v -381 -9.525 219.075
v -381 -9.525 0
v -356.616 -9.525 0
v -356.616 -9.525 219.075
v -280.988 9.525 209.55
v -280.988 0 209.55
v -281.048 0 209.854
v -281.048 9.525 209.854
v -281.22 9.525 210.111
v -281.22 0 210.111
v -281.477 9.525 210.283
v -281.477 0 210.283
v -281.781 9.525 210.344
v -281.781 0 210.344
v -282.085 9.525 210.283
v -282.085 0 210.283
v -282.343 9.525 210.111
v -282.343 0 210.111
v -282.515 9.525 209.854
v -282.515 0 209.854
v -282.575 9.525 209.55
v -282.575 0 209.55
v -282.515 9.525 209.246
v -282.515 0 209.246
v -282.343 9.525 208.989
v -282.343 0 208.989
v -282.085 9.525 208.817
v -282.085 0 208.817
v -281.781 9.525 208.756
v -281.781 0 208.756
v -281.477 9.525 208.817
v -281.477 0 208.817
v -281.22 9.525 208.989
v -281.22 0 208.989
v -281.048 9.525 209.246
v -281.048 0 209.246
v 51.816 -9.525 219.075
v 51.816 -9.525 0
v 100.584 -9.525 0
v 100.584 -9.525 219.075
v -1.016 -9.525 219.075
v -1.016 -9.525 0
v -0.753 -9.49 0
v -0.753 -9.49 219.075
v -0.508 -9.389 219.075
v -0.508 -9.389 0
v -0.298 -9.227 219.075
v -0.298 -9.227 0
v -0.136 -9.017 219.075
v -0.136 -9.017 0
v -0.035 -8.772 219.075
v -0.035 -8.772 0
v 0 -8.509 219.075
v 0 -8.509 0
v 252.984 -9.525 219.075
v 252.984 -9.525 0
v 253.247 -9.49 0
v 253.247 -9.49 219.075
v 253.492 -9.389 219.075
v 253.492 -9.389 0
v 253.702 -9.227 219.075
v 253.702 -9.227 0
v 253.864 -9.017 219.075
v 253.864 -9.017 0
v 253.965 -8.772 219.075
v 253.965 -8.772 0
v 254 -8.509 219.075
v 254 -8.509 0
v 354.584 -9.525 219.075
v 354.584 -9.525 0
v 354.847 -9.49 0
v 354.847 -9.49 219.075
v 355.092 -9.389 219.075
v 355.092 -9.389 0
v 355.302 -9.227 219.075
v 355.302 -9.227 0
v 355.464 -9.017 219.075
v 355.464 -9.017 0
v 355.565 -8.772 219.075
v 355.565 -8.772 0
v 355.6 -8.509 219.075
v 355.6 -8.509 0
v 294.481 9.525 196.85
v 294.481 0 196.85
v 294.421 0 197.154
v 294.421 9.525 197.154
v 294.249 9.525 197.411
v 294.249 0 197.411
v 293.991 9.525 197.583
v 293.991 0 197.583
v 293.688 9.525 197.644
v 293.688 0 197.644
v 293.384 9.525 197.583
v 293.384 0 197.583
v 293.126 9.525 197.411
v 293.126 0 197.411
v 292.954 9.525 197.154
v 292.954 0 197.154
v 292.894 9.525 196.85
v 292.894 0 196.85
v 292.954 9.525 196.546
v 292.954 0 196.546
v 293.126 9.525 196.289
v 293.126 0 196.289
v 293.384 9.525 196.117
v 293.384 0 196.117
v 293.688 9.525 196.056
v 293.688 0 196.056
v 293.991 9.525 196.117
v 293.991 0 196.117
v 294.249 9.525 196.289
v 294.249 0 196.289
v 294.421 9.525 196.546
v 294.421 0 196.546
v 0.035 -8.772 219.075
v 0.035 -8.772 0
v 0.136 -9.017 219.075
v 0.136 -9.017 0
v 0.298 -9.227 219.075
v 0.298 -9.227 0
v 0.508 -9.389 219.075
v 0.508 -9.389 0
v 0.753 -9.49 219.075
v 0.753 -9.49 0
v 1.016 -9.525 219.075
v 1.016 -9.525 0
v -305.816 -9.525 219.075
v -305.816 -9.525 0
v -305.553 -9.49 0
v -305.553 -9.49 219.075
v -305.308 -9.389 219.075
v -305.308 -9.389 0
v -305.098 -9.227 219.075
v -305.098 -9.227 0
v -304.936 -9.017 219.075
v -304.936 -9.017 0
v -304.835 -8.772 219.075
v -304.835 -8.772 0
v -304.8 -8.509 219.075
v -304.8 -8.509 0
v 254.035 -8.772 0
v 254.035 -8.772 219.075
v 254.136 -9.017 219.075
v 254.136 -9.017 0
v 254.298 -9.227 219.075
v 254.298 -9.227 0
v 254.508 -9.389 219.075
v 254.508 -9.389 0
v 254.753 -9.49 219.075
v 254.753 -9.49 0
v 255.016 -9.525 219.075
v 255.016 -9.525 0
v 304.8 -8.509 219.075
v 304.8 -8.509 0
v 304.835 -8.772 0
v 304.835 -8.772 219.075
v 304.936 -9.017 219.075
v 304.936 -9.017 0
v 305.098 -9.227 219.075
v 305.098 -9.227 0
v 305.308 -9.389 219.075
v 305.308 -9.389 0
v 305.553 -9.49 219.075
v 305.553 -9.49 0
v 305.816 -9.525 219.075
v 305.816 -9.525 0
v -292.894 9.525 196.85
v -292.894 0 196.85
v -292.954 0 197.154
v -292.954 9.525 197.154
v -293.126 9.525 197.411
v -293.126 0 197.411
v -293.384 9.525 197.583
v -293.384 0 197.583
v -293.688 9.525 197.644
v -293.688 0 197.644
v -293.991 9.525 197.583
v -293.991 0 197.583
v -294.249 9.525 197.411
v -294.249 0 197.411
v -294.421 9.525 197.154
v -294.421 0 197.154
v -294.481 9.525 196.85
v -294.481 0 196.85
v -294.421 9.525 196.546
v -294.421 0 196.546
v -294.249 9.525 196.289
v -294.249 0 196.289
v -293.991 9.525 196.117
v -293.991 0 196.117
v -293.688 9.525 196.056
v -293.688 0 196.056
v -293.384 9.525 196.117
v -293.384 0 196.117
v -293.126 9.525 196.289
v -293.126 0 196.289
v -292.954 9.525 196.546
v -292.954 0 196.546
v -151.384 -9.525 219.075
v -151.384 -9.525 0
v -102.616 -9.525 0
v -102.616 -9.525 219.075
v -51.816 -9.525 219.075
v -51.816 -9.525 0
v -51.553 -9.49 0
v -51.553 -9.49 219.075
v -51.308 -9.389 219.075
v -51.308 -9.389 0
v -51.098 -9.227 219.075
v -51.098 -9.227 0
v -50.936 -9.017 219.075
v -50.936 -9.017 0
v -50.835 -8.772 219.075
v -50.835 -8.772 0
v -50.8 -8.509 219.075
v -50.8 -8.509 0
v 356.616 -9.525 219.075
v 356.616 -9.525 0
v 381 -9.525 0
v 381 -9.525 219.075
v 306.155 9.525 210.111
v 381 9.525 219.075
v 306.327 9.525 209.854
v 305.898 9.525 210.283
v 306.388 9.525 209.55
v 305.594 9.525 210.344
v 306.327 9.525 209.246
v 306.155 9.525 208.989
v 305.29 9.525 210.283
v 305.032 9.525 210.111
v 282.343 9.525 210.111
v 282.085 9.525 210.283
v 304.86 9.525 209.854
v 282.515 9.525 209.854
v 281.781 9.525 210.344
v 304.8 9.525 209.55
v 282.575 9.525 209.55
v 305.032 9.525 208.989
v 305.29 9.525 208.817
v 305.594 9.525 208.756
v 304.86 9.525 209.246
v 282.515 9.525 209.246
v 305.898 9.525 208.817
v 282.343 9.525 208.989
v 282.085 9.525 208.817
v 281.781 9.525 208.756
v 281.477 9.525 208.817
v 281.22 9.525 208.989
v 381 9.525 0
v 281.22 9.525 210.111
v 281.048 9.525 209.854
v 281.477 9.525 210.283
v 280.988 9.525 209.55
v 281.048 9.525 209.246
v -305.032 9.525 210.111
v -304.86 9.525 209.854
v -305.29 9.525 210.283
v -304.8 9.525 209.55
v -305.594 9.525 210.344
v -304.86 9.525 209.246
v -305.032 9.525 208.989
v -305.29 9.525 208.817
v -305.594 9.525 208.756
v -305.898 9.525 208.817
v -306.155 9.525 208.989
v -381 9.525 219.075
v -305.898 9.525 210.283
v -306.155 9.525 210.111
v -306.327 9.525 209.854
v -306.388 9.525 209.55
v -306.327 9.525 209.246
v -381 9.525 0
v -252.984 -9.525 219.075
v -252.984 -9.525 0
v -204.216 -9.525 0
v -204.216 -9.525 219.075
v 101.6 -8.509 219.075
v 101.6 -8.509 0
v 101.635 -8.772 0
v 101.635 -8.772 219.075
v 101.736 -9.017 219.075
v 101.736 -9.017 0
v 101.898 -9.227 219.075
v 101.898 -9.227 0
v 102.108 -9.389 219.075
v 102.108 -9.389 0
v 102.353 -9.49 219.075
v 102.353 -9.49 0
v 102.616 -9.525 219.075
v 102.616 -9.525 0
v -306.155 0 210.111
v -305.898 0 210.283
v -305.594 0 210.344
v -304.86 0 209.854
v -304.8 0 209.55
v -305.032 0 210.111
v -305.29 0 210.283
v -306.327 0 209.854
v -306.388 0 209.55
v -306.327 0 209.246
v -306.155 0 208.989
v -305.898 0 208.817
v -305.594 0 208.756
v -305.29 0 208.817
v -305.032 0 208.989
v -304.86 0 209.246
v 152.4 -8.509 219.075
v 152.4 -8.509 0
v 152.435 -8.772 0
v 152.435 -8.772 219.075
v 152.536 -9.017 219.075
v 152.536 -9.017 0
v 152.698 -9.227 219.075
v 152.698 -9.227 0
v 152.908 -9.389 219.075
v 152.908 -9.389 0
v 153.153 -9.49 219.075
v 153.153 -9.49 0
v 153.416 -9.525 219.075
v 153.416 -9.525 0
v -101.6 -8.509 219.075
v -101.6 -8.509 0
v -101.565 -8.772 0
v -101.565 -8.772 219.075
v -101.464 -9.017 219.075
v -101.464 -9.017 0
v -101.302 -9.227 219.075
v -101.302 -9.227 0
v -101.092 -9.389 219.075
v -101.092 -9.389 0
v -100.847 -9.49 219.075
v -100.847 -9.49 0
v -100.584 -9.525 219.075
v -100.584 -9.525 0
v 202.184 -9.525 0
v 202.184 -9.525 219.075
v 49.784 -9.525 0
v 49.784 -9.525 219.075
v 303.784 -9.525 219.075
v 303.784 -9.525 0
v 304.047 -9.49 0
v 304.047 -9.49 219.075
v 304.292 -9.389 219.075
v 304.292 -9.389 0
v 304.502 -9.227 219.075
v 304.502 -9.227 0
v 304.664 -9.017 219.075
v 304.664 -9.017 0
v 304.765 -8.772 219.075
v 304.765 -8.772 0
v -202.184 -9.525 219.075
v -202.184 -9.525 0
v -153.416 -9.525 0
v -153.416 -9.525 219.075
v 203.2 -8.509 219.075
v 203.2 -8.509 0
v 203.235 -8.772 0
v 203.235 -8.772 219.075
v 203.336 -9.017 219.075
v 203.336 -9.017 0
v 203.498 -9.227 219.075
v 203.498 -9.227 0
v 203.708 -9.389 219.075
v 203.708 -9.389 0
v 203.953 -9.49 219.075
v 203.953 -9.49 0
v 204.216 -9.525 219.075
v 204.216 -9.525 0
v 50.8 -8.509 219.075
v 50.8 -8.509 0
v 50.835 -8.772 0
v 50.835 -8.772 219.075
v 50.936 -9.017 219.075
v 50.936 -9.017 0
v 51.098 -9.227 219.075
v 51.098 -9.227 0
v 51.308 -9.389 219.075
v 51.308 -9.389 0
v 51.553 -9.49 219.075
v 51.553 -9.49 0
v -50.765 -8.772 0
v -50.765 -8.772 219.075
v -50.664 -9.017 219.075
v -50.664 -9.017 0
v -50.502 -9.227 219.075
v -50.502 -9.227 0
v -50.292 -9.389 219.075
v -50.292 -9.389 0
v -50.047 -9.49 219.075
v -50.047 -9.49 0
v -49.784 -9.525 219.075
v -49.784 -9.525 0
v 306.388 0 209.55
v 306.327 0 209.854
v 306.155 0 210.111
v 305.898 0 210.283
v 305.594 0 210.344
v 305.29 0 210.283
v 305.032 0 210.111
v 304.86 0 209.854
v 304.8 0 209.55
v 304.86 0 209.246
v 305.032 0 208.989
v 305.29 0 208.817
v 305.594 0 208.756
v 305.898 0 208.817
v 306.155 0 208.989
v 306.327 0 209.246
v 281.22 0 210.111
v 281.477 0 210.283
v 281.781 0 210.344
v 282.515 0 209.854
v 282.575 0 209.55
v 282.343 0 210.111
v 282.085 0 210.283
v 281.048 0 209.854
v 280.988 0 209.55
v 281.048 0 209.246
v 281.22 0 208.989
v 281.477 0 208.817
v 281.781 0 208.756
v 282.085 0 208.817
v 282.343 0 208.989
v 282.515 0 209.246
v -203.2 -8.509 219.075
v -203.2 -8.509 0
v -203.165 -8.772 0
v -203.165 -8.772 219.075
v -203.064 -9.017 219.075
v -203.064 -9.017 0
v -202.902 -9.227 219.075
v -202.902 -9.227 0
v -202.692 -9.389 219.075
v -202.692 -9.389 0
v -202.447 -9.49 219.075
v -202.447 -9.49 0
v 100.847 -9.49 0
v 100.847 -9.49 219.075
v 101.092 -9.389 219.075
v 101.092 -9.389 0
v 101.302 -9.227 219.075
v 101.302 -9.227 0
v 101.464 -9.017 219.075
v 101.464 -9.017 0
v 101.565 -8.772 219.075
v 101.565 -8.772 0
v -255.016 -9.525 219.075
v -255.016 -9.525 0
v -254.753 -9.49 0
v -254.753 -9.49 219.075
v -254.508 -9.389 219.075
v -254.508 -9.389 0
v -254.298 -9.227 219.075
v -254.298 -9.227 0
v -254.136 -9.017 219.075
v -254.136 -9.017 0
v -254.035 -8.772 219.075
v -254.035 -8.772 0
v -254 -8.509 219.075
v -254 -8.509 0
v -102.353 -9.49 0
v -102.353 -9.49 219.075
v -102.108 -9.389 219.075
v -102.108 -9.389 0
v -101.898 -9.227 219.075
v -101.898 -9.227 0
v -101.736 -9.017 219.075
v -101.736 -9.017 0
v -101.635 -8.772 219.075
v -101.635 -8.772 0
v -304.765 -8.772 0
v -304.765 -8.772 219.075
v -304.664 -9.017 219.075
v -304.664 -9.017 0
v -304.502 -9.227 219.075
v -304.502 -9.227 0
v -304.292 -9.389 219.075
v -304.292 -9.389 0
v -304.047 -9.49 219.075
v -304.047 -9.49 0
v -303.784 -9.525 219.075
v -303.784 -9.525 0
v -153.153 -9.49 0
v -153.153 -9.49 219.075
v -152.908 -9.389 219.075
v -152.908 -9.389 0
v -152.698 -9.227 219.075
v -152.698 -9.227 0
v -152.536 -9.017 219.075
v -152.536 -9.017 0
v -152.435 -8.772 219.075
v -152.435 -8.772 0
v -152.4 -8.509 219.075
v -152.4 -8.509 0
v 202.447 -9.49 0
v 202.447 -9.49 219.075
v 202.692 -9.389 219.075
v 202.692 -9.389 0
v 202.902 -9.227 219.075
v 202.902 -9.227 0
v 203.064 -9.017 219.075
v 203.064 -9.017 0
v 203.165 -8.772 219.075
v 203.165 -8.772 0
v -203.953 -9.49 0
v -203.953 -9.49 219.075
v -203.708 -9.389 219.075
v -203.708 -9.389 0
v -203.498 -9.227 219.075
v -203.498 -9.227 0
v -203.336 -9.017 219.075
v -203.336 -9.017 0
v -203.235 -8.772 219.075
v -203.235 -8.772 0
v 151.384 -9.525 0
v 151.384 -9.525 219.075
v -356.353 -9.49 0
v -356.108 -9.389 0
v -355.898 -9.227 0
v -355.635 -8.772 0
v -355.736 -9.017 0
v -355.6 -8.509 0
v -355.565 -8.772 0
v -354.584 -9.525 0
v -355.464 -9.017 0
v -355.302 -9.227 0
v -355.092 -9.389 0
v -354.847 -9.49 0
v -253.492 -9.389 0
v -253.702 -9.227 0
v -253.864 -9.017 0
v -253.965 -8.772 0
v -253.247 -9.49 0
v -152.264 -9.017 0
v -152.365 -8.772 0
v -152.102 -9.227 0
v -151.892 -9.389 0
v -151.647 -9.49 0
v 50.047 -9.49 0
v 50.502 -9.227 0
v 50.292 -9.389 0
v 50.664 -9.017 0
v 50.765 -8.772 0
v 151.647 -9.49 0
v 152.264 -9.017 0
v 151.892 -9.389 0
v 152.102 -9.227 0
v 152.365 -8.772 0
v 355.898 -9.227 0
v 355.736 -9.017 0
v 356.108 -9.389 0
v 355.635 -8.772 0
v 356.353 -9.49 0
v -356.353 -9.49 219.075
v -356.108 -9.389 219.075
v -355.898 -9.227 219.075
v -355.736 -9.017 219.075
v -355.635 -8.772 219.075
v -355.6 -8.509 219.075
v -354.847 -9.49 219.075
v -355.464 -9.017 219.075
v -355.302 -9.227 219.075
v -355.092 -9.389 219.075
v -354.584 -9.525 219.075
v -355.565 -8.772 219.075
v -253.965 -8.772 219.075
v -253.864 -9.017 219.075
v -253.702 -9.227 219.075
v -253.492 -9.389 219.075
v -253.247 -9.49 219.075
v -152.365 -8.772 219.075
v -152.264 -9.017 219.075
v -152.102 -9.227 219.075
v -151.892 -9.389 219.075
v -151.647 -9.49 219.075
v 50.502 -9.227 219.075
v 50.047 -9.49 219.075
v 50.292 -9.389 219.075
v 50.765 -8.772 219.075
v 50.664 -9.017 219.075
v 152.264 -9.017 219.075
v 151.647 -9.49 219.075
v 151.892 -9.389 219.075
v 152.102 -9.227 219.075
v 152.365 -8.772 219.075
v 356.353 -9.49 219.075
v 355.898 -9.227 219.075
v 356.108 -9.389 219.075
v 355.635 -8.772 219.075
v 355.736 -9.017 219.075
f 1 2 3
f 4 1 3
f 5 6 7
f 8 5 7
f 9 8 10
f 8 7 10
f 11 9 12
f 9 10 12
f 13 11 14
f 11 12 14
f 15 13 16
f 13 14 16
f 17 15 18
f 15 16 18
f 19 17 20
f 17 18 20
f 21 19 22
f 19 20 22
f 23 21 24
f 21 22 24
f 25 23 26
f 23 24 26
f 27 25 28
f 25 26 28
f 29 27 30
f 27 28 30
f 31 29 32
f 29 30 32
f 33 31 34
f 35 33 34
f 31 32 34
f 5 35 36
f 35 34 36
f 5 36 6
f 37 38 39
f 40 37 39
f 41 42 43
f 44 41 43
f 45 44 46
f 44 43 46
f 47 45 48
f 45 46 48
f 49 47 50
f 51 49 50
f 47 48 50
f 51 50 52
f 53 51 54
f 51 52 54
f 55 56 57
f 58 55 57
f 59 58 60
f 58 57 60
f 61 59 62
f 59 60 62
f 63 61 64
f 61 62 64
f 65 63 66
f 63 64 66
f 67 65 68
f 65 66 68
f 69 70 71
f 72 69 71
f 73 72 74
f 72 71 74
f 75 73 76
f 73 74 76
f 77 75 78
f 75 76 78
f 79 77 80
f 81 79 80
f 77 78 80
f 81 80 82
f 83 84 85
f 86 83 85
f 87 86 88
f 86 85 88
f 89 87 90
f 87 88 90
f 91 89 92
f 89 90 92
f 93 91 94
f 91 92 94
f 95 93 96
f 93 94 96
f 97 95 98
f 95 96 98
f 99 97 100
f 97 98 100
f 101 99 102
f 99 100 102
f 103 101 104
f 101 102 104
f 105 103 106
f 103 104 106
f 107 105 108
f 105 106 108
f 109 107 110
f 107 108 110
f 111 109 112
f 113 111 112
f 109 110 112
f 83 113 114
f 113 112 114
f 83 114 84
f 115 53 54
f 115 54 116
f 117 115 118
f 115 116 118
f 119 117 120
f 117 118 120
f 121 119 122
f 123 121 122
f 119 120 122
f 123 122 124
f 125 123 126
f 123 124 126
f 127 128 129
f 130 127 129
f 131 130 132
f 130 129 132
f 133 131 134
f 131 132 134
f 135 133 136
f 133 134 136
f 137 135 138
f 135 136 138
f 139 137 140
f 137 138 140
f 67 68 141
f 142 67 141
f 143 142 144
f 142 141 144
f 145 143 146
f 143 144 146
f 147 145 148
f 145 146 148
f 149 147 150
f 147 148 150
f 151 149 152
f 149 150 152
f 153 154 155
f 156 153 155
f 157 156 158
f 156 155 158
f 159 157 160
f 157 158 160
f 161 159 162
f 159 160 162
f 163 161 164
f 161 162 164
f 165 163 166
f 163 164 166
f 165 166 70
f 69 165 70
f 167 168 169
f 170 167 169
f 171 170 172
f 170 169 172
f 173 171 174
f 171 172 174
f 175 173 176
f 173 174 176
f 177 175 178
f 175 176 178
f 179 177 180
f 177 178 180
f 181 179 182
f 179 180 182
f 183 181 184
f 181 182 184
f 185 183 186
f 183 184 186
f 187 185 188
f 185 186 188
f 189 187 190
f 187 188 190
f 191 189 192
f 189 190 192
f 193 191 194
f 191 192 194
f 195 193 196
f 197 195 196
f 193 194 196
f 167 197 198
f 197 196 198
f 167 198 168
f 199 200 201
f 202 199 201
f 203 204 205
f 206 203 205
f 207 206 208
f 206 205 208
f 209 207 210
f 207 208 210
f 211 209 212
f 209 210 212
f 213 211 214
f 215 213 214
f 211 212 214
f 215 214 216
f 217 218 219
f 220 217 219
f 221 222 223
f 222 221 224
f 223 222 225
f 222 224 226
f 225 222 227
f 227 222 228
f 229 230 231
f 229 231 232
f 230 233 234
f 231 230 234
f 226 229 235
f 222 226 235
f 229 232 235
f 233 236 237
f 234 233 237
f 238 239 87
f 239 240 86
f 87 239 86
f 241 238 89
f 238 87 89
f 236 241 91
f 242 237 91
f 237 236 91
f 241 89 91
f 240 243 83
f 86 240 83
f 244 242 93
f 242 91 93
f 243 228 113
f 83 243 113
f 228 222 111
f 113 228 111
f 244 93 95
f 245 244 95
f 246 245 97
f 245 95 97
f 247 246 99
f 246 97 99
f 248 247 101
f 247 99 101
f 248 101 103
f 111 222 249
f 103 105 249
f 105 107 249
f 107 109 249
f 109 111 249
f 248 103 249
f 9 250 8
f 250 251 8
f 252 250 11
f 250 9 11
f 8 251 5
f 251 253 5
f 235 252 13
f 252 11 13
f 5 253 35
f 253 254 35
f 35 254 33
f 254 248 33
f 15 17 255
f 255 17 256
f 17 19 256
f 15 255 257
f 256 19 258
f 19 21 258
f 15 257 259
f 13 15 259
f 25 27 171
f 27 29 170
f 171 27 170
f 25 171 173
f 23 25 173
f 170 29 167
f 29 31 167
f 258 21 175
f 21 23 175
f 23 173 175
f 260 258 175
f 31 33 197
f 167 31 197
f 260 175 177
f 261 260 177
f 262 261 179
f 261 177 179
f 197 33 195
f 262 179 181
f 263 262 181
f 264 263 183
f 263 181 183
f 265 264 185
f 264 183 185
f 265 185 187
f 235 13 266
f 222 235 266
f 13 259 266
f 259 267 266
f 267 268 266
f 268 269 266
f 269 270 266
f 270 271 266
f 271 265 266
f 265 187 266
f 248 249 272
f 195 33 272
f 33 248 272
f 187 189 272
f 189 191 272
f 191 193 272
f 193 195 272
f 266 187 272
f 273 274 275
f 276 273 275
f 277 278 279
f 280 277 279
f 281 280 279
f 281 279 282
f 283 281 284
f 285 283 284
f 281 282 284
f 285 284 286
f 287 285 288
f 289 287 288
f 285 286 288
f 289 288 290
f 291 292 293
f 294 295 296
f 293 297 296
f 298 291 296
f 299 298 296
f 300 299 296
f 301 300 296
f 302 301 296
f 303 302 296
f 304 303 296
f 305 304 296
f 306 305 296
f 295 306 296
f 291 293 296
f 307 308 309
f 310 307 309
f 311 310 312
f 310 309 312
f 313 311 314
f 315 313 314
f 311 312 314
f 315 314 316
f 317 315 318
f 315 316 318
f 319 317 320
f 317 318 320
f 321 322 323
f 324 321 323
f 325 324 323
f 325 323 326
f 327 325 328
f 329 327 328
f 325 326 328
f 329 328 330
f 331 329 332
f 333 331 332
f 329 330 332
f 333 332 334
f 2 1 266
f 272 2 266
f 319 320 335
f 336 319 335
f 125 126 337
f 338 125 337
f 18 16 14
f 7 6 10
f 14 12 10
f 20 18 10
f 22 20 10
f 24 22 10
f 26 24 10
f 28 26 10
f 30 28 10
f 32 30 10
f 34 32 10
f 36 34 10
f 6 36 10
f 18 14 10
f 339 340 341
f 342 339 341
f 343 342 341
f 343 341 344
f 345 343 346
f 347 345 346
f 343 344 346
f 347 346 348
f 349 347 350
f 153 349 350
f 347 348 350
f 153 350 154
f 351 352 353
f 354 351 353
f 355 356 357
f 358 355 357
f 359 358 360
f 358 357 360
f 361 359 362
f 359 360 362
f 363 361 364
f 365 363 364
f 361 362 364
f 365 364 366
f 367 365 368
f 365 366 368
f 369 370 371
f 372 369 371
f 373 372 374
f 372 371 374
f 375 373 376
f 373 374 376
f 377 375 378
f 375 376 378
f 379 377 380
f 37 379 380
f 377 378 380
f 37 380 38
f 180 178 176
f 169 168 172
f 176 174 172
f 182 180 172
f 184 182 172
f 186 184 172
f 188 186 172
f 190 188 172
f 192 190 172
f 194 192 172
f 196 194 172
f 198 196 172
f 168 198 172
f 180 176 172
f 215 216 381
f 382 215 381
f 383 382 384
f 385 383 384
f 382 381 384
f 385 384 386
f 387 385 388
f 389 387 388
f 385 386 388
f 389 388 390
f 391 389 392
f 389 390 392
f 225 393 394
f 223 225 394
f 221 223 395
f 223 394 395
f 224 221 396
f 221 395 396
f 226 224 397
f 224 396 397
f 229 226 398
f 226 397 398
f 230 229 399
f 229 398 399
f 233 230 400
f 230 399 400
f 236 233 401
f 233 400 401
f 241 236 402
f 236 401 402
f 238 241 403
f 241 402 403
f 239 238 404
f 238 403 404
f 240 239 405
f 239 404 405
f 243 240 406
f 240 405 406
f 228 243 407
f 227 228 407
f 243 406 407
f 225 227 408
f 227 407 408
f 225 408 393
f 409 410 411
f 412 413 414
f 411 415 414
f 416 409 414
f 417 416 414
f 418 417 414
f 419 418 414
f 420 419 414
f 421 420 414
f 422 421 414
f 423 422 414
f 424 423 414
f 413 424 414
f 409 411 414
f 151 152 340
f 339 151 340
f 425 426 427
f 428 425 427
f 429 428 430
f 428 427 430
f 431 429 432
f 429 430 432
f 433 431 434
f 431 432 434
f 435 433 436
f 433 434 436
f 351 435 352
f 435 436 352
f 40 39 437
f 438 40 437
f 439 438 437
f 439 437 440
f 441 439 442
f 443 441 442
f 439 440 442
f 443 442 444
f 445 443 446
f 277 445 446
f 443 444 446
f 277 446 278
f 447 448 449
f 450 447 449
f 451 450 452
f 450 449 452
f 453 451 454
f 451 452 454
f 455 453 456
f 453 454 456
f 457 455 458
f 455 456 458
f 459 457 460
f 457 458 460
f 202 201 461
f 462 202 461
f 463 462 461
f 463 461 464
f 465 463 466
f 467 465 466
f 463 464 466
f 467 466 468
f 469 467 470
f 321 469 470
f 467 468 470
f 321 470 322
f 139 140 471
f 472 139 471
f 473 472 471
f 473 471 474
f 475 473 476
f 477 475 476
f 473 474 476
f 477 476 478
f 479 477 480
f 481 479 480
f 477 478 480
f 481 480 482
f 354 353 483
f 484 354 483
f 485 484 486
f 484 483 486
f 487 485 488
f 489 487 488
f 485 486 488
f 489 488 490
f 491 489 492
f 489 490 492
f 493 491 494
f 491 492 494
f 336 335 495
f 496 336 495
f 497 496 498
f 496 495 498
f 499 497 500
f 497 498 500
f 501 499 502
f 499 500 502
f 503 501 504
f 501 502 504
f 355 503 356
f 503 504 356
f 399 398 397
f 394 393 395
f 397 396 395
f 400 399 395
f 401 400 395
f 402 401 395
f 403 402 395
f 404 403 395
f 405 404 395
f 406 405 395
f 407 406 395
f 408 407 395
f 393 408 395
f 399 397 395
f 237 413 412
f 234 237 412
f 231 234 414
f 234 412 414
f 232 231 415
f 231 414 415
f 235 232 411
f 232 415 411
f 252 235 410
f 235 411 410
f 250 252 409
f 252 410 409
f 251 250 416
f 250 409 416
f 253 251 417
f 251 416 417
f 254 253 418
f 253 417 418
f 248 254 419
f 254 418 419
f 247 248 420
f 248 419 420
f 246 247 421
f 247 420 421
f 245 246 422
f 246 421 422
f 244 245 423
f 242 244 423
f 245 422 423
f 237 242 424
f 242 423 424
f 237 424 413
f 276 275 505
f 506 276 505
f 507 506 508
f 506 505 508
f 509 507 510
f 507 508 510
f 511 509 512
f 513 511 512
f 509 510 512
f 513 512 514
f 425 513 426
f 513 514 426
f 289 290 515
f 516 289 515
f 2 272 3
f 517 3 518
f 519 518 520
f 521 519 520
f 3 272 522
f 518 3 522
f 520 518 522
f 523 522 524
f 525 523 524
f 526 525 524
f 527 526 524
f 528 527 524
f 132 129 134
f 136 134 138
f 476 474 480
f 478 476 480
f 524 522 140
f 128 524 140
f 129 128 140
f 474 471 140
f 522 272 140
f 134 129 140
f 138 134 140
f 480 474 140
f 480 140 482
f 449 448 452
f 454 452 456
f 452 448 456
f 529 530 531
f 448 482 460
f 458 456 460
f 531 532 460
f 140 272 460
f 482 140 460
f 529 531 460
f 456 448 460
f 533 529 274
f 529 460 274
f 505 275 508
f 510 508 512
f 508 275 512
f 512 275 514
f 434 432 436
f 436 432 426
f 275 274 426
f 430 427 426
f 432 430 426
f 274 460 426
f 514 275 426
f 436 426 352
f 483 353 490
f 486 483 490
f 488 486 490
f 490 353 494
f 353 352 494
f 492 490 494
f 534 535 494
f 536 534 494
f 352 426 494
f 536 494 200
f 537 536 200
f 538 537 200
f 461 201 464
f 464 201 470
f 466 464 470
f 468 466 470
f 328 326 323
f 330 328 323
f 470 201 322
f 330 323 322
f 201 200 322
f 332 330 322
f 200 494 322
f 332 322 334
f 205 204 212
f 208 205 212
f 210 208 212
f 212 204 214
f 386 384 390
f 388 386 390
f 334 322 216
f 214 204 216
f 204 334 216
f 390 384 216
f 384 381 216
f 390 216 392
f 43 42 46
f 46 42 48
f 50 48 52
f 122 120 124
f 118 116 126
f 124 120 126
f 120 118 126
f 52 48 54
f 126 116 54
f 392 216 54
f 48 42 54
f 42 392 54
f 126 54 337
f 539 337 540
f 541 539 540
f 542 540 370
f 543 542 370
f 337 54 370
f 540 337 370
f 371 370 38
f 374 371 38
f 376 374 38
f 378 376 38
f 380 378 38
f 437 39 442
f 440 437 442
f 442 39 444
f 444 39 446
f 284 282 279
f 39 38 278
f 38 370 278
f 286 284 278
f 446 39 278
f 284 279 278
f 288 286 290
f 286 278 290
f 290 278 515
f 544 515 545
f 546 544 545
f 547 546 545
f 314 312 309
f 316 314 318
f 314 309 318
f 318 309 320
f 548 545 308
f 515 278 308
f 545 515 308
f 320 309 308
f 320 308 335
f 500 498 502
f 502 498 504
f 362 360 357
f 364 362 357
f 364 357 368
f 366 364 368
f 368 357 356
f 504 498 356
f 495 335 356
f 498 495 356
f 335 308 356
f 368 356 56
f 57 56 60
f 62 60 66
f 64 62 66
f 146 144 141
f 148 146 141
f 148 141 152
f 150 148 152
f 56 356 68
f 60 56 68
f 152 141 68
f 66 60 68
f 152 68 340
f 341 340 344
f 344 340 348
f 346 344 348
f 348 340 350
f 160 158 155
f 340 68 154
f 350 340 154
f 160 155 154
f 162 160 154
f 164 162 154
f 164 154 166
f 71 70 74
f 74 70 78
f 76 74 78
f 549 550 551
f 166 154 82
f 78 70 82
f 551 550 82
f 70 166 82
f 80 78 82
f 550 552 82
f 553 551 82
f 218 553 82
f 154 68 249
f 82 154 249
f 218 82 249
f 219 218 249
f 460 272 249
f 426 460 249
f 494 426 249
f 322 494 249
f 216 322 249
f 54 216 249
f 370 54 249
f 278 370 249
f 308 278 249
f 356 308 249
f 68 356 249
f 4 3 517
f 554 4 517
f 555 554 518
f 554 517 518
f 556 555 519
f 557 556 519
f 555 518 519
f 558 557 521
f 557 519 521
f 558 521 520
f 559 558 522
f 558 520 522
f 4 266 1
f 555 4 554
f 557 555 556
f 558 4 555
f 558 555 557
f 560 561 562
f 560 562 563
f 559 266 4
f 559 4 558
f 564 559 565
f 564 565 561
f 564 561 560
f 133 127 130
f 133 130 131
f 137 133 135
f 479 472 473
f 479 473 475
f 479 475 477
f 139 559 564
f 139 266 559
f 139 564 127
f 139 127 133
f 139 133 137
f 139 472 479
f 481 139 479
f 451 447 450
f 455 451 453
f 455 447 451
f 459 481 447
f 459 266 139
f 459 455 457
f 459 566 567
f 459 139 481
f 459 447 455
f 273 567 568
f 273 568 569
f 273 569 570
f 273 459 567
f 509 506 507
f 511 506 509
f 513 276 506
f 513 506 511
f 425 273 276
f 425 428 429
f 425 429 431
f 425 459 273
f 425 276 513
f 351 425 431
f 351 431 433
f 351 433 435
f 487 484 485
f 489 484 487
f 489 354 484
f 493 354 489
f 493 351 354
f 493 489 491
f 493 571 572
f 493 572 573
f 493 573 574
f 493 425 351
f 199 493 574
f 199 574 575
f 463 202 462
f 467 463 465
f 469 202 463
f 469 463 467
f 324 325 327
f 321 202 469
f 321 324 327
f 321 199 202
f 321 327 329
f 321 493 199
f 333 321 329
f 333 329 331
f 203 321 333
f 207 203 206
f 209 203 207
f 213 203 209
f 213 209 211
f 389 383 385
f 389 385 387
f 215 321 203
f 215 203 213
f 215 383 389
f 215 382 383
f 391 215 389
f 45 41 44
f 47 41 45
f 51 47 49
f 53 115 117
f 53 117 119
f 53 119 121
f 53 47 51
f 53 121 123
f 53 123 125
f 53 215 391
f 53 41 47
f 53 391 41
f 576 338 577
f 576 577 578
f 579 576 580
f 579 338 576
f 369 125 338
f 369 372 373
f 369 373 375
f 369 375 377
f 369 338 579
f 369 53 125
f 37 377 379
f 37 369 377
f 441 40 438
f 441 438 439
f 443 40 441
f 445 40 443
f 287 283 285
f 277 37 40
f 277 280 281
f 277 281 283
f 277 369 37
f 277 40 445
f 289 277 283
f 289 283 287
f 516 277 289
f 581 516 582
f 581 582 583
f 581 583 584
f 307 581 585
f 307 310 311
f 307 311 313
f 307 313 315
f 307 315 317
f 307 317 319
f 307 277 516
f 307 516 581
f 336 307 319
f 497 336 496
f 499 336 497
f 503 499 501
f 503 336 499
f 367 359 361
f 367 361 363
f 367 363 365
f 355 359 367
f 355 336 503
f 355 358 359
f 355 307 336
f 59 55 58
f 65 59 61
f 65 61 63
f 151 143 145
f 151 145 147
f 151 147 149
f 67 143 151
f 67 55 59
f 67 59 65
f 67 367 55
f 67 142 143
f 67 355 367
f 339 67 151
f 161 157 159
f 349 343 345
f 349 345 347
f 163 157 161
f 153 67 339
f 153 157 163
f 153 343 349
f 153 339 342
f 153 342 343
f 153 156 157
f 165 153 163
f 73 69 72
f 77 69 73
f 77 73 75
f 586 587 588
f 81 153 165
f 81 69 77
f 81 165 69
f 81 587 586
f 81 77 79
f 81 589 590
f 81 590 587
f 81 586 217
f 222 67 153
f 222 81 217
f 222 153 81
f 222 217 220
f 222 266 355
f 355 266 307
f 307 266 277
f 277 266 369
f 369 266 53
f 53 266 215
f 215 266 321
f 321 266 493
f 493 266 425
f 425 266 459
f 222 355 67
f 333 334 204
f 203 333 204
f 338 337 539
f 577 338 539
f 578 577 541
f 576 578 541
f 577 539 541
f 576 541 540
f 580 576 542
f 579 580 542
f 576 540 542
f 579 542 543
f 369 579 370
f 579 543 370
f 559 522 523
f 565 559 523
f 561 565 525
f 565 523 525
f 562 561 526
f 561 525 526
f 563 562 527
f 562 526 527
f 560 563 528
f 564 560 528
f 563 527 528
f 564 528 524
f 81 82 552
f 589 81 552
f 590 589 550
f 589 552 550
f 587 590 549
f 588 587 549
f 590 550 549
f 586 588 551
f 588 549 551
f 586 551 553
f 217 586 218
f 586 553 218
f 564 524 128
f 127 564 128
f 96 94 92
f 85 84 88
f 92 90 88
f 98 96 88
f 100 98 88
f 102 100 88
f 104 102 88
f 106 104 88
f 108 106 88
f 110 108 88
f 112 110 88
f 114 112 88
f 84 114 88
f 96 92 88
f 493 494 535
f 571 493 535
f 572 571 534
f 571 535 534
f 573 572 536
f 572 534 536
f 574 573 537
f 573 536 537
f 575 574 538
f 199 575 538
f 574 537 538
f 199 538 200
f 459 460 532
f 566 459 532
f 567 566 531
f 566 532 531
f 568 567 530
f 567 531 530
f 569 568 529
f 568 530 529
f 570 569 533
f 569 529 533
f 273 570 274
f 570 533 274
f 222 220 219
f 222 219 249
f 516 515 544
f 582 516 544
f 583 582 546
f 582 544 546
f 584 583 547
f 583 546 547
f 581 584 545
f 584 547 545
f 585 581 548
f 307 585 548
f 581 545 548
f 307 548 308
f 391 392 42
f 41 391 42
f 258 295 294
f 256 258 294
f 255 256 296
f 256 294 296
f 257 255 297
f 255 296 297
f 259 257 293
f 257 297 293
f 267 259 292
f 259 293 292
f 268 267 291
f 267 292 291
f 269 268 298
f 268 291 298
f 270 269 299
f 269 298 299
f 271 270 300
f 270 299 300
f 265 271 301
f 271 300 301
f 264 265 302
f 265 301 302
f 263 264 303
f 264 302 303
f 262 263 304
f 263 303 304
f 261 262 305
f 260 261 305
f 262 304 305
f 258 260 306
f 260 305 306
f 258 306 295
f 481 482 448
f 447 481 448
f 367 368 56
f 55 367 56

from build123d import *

# Parameters (mm, degrees)
F1_DEPTH = 219.075
F2_W     = 343.069662
F2_H     = 137.227848
F2_W_2   = 304.364362
F2_H_2   = 195.285798
F3_DEPTH = 1143
F4_R     = 0.79375
F5_DEPTH = 25.4


with BuildPart() as f1:
    # F0 (on Top) → F1 (new body)
    with BuildSketch(Plane.XY):
        with BuildLine():
            Line((458.216, -9.525), (508, -9.525))
            Line((508, -9.525), (508, 9.525))
            Line((508, 9.525), (-508, 9.525))
            Line((-508, 9.525), (-508, -8.509))
            ThreePointArc((-508, -8.509), (-507.70242, -9.22742), (-506.984, -9.525))
            Line((-506.984, -9.525), (-458.216, -9.525))
            ThreePointArc((-458.216, -9.525), (-457.49758, -9.22742), (-457.2, -8.509))
            ThreePointArc((-457.2, -8.509), (-456.90242, -9.22742), (-456.184, -9.525))
            Line((-456.184, -9.525), (-407.416, -9.525))
            ThreePointArc((-407.416, -9.525), (-406.69758, -9.22742), (-406.4, -8.509))
            ThreePointArc((-406.4, -8.509), (-406.10242, -9.22742), (-405.384, -9.525))
            Line((-405.384, -9.525), (-356.616, -9.525))
            ThreePointArc((-356.616, -9.525), (-355.89758, -9.22742), (-355.6, -8.509))
            ThreePointArc((-355.6, -8.509), (-355.30242, -9.22742), (-354.584, -9.525))
            Line((-354.584, -9.525), (-305.816, -9.525))
            ThreePointArc((-305.816, -9.525), (-305.09758, -9.22742), (-304.8, -8.509))
            ThreePointArc((-304.8, -8.509), (-304.50242, -9.22742), (-303.784, -9.525))
            Line((-303.784, -9.525), (-255.016, -9.525))
            ThreePointArc((-255.016, -9.525), (-254.29758, -9.22742), (-254, -8.509))
            ThreePointArc((-254, -8.509), (-253.70242, -9.22742), (-252.984, -9.525))
            Line((-252.984, -9.525), (-204.216, -9.525))
            ThreePointArc((-204.216, -9.525), (-203.49758, -9.22742), (-203.2, -8.509))
            ThreePointArc((-203.2, -8.509), (-202.90242, -9.22742), (-202.184, -9.525))
            Line((-202.184, -9.525), (-153.416, -9.525))
            ThreePointArc((-153.416, -9.525), (-152.69758, -9.22742), (-152.4, -8.509))
            ThreePointArc((-152.4, -8.509), (-152.10242, -9.22742), (-151.384, -9.525))
            Line((-151.384, -9.525), (-102.616, -9.525))
            ThreePointArc((-102.616, -9.525), (-101.89758, -9.22742), (-101.6, -8.509))
            ThreePointArc((-101.6, -8.509), (-101.30242, -9.22742), (-100.584, -9.525))
            Line((-100.584, -9.525), (-51.816, -9.525))
            ThreePointArc((-51.816, -9.525), (-51.09758, -9.22742), (-50.8, -8.509))
            ThreePointArc((-50.8, -8.509), (-50.50242, -9.22742), (-49.784, -9.525))
            Line((-49.784, -9.525), (-1.016, -9.525))
            ThreePointArc((-1.016, -9.525), (-0.29758, -9.22742), (0, -8.509))
            ThreePointArc((0, -8.509), (0.29758, -9.22742), (1.016, -9.525))
            Line((1.016, -9.525), (49.784, -9.525))
            ThreePointArc((49.784, -9.525), (50.50242, -9.22742), (50.8, -8.509))
            ThreePointArc((50.8, -8.509), (51.09758, -9.22742), (51.816, -9.525))
            Line((51.816, -9.525), (100.584, -9.525))
            ThreePointArc((100.584, -9.525), (101.30242, -9.22742), (101.6, -8.509))
            ThreePointArc((101.6, -8.509), (101.89758, -9.22742), (102.616, -9.525))
            Line((102.616, -9.525), (151.384, -9.525))
            ThreePointArc((151.384, -9.525), (152.10242, -9.22742), (152.4, -8.509))
            ThreePointArc((152.4, -8.509), (152.69758, -9.22742), (153.416, -9.525))
            Line((153.416, -9.525), (202.184, -9.525))
            ThreePointArc((202.184, -9.525), (202.90242, -9.22742), (203.2, -8.509))
            ThreePointArc((203.2, -8.509), (203.49758, -9.22742), (204.216, -9.525))
            Line((204.216, -9.525), (252.984, -9.525))
            ThreePointArc((252.984, -9.525), (253.70242, -9.22742), (254, -8.509))
            ThreePointArc((254, -8.509), (254.29758, -9.22742), (255.016, -9.525))
            Line((255.016, -9.525), (303.784, -9.525))
            ThreePointArc((303.784, -9.525), (304.50242, -9.22742), (304.8, -8.509))
            ThreePointArc((304.8, -8.509), (305.09758, -9.22742), (305.816, -9.525))
            Line((305.816, -9.525), (354.584, -9.525))
            ThreePointArc((354.584, -9.525), (355.30242, -9.22742), (355.6, -8.509))
            ThreePointArc((355.6, -8.509), (355.89758, -9.22742), (356.616, -9.525))
            Line((356.616, -9.525), (405.384, -9.525))
            ThreePointArc((405.384, -9.525), (406.10242, -9.22742), (406.4, -8.509))
            ThreePointArc((406.4, -8.509), (406.69758, -9.22742), (407.416, -9.525))
            Line((407.416, -9.525), (456.184, -9.525))
            ThreePointArc((456.184, -9.525), (456.90242, -9.22742), (457.2, -8.509))
            ThreePointArc((457.2, -8.509), (457.49758, -9.22742), (458.216, -9.525))
        make_face()
        with BuildLine():
            ThreePointArc((-506.984, -9.525), (-507.70242, -9.22742), (-508, -8.509))
            Line((-508, -8.509), (-508, -9.525))
            Line((-508, -9.525), (-506.984, -9.525))
        make_face()
    extrude(amount=F1_DEPTH)

    # F2 (on Top) → F3 (cut)
    with BuildSketch(Plane.XY):
        with Locations((552.534831, -20.971623)):
            Rectangle(F2_W, F2_H)
        with Locations((-533.182181, -39.444607)):
            Rectangle(F2_W_2, F2_H_2)
    extrude(amount=F3_DEPTH, mode=Mode.SUBTRACT)

    # F4 (on Front) → F5 (cut)
    with BuildSketch(Plane.XZ):
        with Locations((-293.6875, 196.85)):
            Circle(F4_R)
        with Locations((-281.78125, 209.55)):
            Circle(F4_R)
        with Locations((-305.59375, 209.55)):
            Circle(F4_R)
        with Locations((293.6875, 196.85)):
            Circle(F4_R)
        with Locations((305.59375, 209.55)):
            Circle(F4_R)
        with Locations((281.78125, 209.55)):
            Circle(F4_R)
    extrude(amount=-F5_DEPTH, mode=Mode.SUBTRACT)


solid = f1.part
